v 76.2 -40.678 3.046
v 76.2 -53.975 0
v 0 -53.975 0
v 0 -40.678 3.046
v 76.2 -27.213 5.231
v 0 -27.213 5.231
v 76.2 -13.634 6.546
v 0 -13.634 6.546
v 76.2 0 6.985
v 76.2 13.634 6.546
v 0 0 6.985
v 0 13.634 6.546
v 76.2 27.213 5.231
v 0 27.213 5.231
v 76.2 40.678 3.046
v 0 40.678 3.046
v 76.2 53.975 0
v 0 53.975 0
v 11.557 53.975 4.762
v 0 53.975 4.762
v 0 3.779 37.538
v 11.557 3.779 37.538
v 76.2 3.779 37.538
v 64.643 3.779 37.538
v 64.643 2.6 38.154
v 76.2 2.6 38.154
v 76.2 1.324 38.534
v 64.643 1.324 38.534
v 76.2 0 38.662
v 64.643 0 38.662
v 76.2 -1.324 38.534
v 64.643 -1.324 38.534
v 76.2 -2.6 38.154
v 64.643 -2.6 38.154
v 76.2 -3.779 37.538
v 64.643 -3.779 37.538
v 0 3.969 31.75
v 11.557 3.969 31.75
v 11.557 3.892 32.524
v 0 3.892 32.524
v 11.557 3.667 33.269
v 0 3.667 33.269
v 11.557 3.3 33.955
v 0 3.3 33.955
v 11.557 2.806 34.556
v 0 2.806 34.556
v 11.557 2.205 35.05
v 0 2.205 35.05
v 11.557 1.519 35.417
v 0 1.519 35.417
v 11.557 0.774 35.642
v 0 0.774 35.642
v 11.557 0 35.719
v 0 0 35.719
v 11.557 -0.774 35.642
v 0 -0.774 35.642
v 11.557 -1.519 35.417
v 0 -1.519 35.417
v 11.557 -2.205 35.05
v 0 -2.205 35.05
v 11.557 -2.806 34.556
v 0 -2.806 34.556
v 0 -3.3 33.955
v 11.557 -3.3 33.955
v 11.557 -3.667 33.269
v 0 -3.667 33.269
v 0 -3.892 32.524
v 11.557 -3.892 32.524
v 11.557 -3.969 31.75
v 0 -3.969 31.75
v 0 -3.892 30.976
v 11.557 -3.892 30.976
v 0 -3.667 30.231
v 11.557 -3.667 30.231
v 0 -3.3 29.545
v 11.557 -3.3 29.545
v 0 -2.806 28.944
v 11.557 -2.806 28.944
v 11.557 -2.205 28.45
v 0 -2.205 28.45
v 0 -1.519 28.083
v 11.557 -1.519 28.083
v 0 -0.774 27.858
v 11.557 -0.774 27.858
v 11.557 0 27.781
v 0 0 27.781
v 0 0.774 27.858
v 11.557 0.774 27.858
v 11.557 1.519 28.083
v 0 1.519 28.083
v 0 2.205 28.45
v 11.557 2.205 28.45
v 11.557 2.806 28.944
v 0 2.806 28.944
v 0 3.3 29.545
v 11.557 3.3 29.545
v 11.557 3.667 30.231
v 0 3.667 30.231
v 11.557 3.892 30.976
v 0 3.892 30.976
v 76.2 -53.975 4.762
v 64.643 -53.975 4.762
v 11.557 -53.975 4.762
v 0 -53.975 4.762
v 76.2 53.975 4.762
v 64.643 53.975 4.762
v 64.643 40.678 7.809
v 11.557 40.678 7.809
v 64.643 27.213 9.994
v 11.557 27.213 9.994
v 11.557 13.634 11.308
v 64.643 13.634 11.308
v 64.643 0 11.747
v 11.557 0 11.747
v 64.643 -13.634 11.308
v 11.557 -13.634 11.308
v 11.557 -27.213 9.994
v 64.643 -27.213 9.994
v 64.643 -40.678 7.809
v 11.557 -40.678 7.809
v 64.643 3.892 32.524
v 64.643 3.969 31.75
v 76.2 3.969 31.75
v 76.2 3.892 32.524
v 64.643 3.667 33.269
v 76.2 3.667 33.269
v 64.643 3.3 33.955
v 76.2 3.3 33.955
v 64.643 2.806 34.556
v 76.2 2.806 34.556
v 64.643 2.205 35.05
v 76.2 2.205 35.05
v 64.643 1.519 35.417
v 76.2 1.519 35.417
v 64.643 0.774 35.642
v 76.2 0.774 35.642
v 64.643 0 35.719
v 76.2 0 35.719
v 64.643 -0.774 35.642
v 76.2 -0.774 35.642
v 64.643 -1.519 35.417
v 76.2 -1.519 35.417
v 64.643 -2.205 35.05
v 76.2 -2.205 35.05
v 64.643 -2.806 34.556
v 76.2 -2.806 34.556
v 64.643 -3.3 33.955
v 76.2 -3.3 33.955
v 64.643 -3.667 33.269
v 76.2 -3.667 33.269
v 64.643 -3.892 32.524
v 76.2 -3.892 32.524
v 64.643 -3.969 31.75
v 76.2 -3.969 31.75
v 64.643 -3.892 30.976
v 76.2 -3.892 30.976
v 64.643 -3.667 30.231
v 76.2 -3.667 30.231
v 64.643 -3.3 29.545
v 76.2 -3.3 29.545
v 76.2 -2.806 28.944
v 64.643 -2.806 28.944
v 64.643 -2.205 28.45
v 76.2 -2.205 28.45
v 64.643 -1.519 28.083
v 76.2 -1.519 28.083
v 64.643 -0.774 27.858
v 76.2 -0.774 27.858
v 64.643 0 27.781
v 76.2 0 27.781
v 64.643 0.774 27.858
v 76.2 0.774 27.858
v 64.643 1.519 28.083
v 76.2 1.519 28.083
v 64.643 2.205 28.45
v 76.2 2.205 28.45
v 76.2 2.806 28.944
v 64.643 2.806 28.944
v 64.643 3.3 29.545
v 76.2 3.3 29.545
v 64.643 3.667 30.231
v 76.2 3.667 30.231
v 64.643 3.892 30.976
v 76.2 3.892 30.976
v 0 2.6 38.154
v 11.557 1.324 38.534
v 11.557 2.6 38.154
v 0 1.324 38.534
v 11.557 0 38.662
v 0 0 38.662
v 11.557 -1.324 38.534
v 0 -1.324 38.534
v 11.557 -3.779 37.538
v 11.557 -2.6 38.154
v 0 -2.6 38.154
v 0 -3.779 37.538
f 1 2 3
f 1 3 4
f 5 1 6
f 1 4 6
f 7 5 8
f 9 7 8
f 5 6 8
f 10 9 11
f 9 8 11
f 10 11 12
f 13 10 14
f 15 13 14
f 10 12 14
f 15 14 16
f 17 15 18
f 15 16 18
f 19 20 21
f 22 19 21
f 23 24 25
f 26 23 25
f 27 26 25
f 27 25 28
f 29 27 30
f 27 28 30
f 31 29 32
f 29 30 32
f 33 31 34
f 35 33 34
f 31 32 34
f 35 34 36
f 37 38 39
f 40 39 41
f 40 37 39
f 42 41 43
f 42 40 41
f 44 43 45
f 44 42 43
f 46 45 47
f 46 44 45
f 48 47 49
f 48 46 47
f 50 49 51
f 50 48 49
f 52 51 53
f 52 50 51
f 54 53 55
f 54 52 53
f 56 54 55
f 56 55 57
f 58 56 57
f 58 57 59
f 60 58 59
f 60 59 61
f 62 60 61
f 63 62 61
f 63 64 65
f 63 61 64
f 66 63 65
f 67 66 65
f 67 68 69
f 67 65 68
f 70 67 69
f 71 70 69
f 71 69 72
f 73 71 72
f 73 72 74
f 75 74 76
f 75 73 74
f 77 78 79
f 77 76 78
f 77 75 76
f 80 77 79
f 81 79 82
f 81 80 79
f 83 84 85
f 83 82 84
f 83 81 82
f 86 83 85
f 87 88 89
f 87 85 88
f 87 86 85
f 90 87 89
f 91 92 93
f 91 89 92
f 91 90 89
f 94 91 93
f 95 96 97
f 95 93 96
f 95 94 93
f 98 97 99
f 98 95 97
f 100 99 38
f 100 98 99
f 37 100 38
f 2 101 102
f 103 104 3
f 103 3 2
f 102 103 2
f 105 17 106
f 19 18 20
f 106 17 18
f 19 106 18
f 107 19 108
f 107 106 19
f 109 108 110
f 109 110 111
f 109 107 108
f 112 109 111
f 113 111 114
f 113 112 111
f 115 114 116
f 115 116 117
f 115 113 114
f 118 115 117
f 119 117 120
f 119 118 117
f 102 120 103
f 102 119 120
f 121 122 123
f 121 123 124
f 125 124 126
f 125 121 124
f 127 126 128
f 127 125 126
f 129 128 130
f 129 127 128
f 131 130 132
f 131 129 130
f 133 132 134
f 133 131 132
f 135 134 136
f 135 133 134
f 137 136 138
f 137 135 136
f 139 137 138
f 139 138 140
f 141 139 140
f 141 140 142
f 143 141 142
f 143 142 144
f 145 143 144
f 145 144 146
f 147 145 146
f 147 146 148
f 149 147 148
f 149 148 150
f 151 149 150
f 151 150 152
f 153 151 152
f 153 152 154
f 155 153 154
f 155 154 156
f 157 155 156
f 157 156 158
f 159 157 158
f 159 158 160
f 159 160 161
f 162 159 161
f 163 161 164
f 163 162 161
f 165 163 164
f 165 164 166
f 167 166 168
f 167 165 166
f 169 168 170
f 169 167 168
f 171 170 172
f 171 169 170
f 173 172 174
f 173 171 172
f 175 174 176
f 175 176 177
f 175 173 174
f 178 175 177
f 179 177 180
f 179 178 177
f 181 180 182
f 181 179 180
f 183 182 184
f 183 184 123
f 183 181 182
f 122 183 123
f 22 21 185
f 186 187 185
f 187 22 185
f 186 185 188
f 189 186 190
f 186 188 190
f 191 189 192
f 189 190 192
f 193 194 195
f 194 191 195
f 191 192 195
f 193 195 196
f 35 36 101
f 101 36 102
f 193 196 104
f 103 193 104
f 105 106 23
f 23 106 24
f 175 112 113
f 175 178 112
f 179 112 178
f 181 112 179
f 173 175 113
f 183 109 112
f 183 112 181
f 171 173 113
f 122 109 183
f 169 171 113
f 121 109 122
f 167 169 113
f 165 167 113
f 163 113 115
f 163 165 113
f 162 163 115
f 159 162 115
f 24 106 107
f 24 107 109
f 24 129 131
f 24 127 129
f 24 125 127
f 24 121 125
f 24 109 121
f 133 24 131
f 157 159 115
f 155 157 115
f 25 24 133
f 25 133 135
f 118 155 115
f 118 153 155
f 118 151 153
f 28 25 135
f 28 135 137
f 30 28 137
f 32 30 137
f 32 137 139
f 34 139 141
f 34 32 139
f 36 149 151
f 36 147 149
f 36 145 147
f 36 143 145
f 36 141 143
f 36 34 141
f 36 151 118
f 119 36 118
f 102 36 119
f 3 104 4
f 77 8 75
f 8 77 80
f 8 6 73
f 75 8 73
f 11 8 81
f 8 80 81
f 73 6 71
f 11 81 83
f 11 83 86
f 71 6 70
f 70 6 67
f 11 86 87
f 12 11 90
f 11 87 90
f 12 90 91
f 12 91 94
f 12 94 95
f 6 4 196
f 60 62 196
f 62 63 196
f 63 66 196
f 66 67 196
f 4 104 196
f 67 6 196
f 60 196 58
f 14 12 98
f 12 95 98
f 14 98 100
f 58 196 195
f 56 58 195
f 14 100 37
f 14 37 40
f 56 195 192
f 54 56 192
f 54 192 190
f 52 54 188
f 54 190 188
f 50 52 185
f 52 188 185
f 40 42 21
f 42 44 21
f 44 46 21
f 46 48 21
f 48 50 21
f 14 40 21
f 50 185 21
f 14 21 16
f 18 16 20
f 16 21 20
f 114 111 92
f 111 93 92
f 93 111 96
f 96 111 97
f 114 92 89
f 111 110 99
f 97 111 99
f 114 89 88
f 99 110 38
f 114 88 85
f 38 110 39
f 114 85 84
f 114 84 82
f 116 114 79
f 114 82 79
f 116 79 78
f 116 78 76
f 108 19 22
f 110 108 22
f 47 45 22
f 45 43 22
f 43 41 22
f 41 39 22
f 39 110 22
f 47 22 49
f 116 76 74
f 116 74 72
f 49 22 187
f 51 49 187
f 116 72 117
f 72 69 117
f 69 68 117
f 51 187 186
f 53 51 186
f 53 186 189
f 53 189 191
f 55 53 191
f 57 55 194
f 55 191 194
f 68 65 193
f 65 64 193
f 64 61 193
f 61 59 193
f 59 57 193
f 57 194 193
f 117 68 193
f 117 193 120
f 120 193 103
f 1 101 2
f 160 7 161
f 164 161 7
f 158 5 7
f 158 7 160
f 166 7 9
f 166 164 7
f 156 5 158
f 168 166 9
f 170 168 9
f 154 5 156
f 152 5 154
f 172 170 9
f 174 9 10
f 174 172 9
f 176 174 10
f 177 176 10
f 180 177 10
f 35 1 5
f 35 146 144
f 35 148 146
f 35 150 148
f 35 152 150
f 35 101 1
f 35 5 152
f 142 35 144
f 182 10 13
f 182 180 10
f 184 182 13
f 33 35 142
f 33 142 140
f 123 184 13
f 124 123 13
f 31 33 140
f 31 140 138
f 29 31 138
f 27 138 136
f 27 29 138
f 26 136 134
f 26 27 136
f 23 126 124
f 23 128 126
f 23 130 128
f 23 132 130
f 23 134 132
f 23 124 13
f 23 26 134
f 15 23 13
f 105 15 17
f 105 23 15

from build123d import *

# Parameters (mm, degrees)
F0_R          = 3.96875
F1_DEPTH      = 76.2
F4_DEPTH      = 26.543
F4_DEPTH_BACK = 26.543


with BuildPart() as f1:
    # F0 (on Right) → F1 (new body)
    with BuildSketch(Plane.YZ):
        with BuildLine():
            Line((-53.975, 4.7625), (-53.975, 0))
            ThreePointArc((-53.975, 0), (0, 6.985), (53.975, 0))
            Line((53.975, 0), (53.975, 4.7625))
            Line((53.975, 4.7625), (3.7789439849, 37.5375718687))
            ThreePointArc((3.7789439849, 37.5375718687), (0, 38.6620478714), (-3.7789439849, 37.5375718687))
            Line((-3.7789439849, 37.5375718687), (-53.975, 4.7625))
        make_face()
        with Locations((0, 31.75)):
            Circle(F0_R, mode=Mode.SUBTRACT)
    extrude(amount=F1_DEPTH)

    # F3 (on offset) → F4 (cut, two sides)
    with BuildSketch(Plane(origin=(38.1, 0, 0), x_dir=(0, -1, 0), z_dir=(-1, 0, 0))) as f4_sk:
        with BuildLine():
            ThreePointArc((3.7789439849, 37.5375718687), (0, 38.6620478714), (-3.7789439849, 37.5375718687))
            Line((-3.7789439849, 37.5375718687), (-53.975, 4.7625))
            ThreePointArc((-53.975, 4.7625), (0, 11.7472640284), (53.975, 4.7625))
            Line((53.975, 4.7625), (3.7789439849, 37.5375718687))
        make_face()
    extrude(amount=F4_DEPTH, mode=Mode.SUBTRACT)
    extrude(f4_sk.sketch, amount=-F4_DEPTH_BACK, mode=Mode.SUBTRACT)


solid = f1.part
